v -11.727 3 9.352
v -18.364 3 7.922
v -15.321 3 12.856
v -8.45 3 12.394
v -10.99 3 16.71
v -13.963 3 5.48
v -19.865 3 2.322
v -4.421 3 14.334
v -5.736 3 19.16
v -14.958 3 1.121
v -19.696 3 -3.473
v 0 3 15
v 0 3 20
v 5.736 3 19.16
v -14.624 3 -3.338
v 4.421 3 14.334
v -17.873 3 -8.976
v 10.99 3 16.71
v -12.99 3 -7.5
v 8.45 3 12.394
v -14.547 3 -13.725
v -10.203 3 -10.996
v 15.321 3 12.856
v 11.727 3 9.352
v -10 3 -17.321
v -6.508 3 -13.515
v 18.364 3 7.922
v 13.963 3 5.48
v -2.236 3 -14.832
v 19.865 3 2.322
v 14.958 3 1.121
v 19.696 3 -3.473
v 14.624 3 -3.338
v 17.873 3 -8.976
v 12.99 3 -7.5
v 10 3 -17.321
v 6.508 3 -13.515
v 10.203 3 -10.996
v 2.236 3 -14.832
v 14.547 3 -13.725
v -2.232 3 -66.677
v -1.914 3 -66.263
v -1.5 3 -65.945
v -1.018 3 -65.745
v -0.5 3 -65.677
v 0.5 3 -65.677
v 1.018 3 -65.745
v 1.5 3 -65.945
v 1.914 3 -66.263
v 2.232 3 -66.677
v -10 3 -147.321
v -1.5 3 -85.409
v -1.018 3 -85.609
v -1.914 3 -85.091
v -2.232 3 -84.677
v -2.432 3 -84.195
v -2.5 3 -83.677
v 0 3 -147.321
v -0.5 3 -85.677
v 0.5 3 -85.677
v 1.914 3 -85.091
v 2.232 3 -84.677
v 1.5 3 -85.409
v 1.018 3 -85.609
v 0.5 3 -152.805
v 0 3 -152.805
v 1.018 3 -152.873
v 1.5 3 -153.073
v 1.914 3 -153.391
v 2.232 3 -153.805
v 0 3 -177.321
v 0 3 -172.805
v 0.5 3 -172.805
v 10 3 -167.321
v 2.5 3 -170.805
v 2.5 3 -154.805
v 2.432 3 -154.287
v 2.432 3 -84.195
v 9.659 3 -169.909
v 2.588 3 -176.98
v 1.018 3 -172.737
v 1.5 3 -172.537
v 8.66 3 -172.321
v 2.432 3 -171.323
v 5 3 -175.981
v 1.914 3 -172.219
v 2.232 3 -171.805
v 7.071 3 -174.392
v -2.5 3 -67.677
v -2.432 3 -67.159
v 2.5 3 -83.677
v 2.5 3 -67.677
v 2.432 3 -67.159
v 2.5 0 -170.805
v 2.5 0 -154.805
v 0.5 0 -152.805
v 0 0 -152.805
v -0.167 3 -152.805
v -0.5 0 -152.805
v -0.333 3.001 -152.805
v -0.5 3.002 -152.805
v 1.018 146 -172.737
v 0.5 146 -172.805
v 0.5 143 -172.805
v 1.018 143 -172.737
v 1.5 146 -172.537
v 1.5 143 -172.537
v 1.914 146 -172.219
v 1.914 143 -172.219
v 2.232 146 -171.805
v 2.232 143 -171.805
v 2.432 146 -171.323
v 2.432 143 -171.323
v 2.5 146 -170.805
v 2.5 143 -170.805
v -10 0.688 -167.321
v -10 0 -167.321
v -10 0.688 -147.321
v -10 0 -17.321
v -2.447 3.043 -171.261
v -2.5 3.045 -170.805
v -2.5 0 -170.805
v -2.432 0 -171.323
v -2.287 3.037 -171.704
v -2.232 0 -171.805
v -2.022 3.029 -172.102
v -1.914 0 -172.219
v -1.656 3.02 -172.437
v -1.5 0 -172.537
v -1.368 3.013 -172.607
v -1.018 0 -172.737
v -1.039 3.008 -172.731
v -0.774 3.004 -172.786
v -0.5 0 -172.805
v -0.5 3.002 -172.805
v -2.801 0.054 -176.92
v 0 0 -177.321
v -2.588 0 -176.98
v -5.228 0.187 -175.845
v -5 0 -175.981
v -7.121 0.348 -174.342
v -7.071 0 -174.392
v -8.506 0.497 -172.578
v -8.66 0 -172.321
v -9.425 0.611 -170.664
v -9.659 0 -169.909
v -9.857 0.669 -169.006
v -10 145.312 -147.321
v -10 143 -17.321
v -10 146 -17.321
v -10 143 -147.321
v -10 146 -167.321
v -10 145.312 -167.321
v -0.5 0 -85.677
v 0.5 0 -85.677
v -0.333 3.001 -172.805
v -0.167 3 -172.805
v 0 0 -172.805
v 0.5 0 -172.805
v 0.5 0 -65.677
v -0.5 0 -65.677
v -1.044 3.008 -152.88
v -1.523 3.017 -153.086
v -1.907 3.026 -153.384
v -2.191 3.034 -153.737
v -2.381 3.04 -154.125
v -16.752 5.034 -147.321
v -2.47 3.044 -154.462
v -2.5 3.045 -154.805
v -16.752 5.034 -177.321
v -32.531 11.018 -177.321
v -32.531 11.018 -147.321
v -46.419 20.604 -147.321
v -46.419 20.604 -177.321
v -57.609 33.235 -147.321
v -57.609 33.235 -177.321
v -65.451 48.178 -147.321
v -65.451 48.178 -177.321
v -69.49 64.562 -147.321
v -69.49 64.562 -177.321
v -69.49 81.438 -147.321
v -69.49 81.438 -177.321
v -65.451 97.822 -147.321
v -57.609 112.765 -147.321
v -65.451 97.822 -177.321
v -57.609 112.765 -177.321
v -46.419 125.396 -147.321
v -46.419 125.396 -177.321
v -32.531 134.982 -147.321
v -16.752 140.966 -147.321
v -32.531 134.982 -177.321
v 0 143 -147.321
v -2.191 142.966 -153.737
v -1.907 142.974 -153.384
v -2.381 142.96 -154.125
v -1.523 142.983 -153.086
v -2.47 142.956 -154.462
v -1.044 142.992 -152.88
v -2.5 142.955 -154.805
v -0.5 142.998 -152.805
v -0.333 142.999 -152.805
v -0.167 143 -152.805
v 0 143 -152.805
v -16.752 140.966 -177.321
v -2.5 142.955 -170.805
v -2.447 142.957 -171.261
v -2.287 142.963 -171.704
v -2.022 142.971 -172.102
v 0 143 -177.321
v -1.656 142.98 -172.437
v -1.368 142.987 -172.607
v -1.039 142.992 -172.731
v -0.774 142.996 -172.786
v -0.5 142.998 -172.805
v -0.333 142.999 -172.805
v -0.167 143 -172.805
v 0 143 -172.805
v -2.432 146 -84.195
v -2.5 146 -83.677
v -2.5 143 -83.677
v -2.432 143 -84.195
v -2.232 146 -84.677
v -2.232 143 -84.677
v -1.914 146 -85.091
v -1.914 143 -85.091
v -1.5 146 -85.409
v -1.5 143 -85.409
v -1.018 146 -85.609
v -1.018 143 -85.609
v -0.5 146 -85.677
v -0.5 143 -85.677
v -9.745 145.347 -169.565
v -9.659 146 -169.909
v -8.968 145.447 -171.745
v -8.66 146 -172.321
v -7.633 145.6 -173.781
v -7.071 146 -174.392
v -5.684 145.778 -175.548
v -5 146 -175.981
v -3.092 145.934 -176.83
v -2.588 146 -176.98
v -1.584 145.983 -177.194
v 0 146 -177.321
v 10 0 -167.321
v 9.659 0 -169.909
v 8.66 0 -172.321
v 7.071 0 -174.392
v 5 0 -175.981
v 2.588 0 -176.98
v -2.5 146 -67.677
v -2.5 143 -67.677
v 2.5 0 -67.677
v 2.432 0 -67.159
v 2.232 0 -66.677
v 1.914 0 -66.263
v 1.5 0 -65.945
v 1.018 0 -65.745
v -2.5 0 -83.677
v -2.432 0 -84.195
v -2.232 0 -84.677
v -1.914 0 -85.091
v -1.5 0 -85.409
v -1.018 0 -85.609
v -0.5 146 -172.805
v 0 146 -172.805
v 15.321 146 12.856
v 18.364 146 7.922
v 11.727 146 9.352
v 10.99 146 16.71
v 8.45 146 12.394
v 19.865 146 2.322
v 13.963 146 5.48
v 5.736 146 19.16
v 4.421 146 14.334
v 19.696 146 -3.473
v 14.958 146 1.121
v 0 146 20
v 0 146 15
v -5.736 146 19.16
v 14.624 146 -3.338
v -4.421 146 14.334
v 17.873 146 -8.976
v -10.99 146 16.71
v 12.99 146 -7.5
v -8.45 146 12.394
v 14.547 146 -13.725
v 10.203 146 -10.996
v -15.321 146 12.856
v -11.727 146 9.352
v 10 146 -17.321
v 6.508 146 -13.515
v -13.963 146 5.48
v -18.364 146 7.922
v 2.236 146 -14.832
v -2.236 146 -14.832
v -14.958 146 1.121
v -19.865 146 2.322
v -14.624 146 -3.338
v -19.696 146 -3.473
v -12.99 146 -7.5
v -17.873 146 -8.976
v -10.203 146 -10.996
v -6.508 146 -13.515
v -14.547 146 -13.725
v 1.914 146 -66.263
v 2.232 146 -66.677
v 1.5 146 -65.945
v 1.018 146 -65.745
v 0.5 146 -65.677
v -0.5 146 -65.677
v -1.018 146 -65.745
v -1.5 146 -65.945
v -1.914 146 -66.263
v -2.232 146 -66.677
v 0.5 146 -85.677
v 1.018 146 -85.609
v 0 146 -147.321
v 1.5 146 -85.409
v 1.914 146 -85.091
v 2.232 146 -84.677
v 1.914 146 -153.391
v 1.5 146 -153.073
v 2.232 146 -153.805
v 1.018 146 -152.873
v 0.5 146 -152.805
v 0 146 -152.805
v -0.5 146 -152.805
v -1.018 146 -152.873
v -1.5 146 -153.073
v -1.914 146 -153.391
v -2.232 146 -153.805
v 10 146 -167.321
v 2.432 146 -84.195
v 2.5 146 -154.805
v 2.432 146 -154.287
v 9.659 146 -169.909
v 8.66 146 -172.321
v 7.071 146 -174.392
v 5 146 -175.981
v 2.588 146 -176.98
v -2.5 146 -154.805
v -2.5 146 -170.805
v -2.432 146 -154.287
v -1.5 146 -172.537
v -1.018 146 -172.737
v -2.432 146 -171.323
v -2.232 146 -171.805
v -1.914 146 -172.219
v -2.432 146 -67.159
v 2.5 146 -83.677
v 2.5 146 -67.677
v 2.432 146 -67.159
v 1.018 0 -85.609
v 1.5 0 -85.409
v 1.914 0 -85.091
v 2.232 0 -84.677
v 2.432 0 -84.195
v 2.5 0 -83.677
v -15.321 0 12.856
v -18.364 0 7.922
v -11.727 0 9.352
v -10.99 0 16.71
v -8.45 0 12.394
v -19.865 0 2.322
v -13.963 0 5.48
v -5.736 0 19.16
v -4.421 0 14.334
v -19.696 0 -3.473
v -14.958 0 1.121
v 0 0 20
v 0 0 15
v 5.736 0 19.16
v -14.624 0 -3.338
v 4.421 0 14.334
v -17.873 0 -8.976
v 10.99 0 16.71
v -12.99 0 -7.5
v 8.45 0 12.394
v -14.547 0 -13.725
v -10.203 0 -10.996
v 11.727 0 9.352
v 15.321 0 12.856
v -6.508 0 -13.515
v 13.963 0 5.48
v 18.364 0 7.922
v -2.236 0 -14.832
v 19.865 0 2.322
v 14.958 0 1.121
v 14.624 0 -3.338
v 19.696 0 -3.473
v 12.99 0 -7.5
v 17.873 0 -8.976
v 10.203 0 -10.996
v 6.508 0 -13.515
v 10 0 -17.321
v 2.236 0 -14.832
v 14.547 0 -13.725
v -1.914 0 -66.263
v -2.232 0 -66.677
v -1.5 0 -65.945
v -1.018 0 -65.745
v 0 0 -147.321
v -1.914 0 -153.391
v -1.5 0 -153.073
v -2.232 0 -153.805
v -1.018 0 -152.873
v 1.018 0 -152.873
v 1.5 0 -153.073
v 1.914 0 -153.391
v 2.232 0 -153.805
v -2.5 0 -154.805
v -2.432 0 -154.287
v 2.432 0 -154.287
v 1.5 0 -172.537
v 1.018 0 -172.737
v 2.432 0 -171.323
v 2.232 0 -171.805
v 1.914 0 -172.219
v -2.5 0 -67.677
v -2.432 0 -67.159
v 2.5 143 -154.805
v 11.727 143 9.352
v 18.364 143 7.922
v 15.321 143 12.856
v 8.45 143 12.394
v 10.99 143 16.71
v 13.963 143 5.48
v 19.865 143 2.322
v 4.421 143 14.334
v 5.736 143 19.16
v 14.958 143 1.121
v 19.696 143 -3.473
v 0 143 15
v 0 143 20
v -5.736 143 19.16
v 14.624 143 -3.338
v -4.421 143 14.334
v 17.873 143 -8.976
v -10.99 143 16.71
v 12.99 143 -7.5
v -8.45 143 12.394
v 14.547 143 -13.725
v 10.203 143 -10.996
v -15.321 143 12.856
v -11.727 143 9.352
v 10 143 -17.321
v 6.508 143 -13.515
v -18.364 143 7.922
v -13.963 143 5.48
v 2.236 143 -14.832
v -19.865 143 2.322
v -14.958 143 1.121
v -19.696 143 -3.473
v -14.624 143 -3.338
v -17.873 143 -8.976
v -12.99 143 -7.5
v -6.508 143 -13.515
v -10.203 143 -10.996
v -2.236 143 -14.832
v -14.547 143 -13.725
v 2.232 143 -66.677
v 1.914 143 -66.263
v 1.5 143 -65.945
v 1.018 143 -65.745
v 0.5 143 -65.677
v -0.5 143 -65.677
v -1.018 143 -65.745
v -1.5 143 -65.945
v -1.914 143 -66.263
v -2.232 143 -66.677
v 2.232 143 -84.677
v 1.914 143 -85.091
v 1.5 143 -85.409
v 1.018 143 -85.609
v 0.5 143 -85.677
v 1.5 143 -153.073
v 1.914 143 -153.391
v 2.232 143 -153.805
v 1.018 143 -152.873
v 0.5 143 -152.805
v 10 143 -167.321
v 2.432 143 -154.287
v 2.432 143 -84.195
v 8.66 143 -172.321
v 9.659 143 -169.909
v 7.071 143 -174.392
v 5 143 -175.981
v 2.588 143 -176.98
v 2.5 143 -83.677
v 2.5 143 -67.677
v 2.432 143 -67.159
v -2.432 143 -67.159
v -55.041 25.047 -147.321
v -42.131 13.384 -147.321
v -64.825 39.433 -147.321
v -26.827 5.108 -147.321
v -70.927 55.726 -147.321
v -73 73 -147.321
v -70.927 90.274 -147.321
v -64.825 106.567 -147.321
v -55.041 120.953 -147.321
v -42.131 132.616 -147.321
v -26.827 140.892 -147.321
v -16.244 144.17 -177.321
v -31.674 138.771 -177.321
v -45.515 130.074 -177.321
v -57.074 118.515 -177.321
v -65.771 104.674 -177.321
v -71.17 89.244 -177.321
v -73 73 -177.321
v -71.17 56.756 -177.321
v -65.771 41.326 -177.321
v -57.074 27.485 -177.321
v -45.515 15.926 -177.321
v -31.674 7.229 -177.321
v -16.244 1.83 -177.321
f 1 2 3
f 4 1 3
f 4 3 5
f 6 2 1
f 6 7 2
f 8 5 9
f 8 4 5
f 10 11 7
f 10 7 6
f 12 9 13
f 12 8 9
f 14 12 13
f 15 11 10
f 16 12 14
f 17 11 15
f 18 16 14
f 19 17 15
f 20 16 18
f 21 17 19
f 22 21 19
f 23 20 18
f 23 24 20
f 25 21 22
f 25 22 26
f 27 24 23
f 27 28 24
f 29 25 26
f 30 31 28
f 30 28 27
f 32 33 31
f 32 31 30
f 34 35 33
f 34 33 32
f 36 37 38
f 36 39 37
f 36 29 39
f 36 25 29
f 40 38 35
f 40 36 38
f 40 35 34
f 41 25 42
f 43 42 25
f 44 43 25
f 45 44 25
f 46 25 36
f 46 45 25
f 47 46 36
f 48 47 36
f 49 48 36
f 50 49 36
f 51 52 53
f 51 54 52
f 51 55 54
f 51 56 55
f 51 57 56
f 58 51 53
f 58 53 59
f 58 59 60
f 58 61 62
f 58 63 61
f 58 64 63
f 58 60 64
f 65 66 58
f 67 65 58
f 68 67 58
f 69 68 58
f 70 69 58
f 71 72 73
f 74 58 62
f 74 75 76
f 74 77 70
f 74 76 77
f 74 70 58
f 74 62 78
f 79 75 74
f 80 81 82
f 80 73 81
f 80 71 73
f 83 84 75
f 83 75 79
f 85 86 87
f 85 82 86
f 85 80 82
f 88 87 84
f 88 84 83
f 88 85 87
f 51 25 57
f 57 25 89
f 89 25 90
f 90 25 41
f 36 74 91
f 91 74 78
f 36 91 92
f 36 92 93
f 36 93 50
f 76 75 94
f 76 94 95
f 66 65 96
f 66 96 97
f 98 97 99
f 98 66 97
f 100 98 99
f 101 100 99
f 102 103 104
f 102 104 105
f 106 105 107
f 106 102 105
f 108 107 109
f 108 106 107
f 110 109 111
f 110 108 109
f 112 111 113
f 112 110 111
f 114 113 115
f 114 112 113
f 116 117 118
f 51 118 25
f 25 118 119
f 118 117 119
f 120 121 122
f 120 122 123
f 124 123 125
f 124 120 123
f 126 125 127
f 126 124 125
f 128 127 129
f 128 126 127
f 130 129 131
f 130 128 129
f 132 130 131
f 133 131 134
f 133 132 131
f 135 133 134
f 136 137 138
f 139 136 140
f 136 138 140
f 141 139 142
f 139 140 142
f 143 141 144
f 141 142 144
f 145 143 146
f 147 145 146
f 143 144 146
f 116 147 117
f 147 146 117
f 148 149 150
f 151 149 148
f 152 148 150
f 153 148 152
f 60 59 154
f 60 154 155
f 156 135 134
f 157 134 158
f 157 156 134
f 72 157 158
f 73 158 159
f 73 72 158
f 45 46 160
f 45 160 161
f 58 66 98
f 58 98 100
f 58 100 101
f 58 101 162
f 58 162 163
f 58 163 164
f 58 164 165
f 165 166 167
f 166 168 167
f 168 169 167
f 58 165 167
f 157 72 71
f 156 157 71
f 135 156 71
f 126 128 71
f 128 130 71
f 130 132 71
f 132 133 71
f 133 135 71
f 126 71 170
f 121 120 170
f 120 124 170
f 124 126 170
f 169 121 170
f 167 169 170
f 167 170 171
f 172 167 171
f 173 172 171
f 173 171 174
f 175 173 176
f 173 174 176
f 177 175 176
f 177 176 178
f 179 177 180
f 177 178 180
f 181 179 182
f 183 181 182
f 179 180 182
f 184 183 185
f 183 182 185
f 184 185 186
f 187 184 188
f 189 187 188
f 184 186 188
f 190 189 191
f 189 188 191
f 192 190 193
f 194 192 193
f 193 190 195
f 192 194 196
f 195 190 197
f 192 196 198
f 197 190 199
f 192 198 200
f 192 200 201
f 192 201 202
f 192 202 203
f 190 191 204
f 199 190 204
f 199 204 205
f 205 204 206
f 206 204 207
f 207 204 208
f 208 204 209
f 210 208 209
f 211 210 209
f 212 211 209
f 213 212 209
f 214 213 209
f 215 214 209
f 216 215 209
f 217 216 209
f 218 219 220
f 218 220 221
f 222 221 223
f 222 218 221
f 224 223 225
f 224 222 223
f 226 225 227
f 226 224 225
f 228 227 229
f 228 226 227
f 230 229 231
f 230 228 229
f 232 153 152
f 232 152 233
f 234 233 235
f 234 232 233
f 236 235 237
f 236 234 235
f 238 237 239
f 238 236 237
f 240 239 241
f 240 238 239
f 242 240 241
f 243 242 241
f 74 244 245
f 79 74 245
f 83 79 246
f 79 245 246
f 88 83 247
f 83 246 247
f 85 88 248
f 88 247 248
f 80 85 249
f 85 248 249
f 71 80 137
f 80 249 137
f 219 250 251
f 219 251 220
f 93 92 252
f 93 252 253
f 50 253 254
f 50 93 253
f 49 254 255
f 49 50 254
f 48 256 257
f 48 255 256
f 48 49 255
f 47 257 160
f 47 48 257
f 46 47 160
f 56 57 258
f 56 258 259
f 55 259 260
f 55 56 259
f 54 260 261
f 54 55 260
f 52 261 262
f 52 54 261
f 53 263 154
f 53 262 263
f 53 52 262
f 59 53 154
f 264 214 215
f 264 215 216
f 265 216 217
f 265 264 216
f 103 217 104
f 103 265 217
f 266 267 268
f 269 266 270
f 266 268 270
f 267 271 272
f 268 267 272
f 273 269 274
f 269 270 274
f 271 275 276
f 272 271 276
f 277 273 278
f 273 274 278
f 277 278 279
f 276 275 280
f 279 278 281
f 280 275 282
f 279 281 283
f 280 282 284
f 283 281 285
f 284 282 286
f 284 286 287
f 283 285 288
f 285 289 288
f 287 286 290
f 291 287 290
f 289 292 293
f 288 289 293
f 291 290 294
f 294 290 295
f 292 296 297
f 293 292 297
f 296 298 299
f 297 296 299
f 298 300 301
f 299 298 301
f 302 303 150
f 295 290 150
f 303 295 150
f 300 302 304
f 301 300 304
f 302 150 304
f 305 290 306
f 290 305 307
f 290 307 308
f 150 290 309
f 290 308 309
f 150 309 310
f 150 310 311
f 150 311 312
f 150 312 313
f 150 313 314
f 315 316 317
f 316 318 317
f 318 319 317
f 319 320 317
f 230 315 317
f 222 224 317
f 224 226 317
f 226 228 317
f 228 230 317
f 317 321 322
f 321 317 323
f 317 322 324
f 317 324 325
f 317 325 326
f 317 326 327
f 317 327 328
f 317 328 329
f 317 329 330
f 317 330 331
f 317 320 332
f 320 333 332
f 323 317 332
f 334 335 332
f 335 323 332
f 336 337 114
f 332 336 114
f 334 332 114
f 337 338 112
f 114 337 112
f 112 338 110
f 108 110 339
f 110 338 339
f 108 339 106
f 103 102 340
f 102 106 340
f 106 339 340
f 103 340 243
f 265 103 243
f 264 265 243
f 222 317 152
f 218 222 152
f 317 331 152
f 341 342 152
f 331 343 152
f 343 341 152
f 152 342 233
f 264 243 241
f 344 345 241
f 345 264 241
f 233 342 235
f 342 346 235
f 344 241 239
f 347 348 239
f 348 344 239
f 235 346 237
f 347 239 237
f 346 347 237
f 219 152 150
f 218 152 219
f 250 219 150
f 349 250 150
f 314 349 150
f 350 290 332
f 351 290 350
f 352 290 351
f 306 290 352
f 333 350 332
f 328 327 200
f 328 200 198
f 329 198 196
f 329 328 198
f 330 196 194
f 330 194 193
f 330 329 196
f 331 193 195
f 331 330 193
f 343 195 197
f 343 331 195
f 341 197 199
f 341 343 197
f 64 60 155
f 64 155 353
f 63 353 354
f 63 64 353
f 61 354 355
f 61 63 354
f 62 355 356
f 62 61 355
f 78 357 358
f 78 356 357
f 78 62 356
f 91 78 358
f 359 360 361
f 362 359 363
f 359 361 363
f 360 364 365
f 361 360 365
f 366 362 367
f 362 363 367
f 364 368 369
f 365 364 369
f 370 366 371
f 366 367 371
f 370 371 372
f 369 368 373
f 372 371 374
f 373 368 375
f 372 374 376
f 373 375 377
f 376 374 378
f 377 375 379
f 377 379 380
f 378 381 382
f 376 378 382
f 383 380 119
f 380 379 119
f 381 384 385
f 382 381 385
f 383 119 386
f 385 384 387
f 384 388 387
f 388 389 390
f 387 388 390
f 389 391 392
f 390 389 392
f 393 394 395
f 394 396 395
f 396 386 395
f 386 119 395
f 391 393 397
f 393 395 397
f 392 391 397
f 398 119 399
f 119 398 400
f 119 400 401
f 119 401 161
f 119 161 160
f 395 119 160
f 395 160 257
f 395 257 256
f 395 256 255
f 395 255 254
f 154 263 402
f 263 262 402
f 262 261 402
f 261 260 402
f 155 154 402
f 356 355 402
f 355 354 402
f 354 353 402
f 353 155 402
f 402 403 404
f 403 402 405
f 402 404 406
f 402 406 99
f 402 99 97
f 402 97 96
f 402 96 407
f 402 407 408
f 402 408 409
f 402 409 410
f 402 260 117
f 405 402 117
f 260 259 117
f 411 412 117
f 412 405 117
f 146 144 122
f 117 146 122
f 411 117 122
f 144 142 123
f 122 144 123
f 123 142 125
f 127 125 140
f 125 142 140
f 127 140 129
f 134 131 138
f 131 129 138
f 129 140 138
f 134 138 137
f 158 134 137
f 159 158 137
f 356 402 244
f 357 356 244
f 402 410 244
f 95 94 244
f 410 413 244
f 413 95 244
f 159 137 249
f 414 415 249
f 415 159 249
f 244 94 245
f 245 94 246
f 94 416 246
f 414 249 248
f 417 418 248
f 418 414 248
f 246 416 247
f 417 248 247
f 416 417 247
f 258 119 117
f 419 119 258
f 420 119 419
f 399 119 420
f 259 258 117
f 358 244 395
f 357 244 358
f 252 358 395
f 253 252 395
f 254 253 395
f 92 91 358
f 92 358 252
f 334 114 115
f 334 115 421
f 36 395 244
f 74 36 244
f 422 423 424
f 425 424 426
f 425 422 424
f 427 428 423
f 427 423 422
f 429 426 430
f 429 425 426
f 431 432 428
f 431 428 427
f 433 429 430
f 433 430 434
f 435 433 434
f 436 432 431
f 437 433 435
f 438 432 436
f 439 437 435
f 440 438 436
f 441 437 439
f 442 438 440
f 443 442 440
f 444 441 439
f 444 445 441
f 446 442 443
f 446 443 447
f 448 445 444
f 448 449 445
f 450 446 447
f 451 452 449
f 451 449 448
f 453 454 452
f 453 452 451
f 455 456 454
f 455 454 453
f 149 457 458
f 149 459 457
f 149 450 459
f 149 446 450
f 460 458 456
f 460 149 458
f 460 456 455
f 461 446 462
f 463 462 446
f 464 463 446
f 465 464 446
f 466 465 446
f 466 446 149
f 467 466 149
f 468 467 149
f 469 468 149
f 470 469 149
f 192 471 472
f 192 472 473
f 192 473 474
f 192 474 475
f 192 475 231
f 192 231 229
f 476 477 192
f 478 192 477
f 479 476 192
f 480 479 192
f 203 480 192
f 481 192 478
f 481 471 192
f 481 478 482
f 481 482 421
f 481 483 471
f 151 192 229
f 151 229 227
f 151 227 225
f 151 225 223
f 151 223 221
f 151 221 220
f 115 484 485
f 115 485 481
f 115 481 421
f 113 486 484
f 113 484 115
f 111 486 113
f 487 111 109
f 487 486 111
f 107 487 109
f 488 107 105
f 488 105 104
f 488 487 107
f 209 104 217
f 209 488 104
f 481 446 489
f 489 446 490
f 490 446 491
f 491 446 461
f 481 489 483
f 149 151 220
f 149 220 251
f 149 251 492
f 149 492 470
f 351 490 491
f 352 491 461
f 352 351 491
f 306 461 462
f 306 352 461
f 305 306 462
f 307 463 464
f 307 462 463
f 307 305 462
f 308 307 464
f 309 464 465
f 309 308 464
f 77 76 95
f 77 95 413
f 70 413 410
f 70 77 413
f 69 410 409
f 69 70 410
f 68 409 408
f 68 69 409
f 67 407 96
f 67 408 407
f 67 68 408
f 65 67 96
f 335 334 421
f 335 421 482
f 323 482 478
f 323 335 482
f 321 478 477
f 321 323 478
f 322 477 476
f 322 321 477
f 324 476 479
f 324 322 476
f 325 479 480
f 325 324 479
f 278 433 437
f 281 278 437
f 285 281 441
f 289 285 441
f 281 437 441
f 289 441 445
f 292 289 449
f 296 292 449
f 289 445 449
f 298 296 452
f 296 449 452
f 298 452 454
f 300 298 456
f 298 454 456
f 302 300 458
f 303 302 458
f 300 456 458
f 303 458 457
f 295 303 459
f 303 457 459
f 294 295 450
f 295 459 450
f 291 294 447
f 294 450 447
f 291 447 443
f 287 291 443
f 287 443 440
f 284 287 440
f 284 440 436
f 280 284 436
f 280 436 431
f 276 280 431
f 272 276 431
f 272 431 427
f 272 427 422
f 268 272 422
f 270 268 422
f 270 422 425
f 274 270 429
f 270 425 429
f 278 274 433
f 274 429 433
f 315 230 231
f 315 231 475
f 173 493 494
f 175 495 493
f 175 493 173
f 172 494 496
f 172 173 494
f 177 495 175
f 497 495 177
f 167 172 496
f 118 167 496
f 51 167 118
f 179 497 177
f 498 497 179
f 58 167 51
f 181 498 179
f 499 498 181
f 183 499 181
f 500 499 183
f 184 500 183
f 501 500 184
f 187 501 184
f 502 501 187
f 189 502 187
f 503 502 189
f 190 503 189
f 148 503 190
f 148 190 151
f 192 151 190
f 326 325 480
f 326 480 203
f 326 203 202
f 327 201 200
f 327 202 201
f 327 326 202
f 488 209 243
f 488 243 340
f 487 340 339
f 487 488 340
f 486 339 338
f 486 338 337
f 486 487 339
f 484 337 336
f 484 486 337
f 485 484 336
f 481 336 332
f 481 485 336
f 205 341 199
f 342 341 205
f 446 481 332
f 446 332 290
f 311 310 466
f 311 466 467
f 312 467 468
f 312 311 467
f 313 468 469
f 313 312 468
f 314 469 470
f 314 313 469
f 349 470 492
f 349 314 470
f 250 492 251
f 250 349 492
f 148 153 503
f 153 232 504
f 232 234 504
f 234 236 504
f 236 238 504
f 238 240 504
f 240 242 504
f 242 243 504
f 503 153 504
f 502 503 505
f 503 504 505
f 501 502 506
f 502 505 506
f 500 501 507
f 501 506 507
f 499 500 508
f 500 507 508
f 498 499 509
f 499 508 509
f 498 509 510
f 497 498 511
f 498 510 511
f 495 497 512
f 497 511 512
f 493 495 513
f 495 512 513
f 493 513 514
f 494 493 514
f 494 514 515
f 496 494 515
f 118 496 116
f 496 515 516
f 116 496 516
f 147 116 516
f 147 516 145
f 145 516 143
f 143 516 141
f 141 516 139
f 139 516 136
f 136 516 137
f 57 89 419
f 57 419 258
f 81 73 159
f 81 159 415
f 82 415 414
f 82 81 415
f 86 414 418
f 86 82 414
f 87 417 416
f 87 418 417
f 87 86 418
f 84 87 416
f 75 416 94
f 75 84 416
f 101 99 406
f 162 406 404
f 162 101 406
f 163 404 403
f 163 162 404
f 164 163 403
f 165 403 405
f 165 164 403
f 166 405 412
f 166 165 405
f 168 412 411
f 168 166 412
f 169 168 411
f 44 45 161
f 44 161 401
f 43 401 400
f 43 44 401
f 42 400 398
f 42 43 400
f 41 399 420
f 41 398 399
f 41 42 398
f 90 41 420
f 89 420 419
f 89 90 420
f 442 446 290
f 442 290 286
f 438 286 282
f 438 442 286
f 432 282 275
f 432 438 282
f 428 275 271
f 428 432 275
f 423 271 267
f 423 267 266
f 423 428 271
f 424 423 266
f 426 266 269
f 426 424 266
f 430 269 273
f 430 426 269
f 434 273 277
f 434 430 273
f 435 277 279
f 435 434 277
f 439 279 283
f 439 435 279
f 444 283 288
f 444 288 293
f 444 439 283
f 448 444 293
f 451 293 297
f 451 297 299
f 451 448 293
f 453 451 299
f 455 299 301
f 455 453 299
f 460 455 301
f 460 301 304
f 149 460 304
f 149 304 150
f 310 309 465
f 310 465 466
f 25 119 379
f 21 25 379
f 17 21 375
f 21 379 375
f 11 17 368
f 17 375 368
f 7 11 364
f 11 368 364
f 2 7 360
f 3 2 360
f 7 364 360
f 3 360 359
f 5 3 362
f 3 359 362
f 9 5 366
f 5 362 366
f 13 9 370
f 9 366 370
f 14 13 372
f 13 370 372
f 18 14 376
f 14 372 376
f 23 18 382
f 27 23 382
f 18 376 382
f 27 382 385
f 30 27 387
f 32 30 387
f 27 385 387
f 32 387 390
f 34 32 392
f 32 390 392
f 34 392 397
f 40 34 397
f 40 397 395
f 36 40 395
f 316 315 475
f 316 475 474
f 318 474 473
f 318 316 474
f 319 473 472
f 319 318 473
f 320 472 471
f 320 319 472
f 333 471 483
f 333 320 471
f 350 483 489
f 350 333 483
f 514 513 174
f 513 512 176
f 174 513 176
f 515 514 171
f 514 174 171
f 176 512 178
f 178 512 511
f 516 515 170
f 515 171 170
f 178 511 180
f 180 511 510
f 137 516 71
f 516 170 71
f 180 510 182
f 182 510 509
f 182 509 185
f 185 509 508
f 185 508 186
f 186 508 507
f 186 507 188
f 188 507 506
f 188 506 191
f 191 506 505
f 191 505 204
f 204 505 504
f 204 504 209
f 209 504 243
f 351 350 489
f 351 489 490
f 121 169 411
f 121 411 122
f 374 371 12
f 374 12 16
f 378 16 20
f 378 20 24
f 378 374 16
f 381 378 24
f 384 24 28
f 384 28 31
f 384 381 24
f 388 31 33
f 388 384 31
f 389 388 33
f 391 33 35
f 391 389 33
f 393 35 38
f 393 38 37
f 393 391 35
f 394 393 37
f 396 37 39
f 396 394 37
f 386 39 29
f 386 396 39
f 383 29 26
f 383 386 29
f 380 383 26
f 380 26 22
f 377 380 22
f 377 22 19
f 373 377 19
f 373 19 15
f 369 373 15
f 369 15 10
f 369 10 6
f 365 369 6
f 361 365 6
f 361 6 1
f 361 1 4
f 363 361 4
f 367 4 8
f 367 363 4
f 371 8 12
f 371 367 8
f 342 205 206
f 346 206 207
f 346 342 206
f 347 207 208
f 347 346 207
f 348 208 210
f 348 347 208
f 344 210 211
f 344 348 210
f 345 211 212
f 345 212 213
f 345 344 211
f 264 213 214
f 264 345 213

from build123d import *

# Parameters (mm, degrees)
SKETCH1_R           = 15
BOSS_EXTRUDE1_DEPTH = 3
BOSS_EXTRUDE5_DEPTH = 30
BOSS_EXTRUDE6_START = 3
SKETCH5_R           = 15
BOSS_EXTRUDE6_DEPTH = 3
CUT_EXTRUDE1_DEPTH  = 242.0136151


with BuildPart() as part:
    # Sketch1 → Boss-Extrude1 (new body)
    with BuildSketch(Plane(origin=(0, 0, 0), x_dir=(1, 0, 0), z_dir=(0, 1, 0))):
        with BuildLine():
            Line((-10, 167.320508076), (-10, 17.320508076))
            ThreePointArc((-10, 17.320508076), (0, -20), (10, 17.320508076))
            Line((10, 17.320508076), (10, 167.320508076))
            ThreePointArc((10, 167.320508076), (0, 177.320508076), (-10, 167.320508076))
        make_face()
        with Locations(Location((0, 0, 0), (0, 0, 270))):
            Circle(SKETCH1_R, mode=Mode.SUBTRACT)
    extrude(amount=BOSS_EXTRUDE1_DEPTH)

    # Sketch4 → Boss-Extrude5 (add)
    with BuildSketch(Plane(origin=(0, 0, -177.320508076), x_dir=(-1, 0, 0), z_dir=(0, 0, -1))):
        with BuildLine():
            Line((0, 0), (0, 3))
            ThreePointArc((0, 3), (70, 73), (0, 143))
            Line((0, 143), (0, 146))
            ThreePointArc((0, 146), (73, 73), (0, 0))
        make_face()
    extrude(amount=-BOSS_EXTRUDE5_DEPTH)

    # Sketch5 → Boss-Extrude6 (add)
    with BuildSketch(Plane(origin=(0, 146, 0), x_dir=(-1, 0, 0), z_dir=(0, -1, 0)).offset(BOSS_EXTRUDE6_START)):
        with BuildLine():
            Line((10, 17.320508076), (10, 167.320508076))
            ThreePointArc((10, 167.320508076), (0, 177.320508076), (-10, 167.320508076))
            Line((-10, 167.320508076), (-10, 17.320508076))
            ThreePointArc((-10, 17.320508076), (0, -20), (10, 17.320508076))
        make_face()
        with Locations(Location((0, 0, 0), (0, 0, 270))):
            Circle(SKETCH5_R, mode=Mode.SUBTRACT)
    extrude(amount=-BOSS_EXTRUDE6_DEPTH)

    # Sketch7 → Cut-Extrude1 (cut, through all)
    with BuildSketch(Plane(origin=(0, 146, 0), x_dir=(1, 0, 0), z_dir=(0, 1, 0))):
        with BuildLine():
            Line((0.5, 152.804939292), (-0.5, 152.804939292))
            ThreePointArc((-0.5, 152.804939292), (-1.914213562, 153.39072573), (-2.5, 154.804939292))
            Line((-2.5, 154.804939292), (-2.5, 170.804939292))
            ThreePointArc((-2.5, 170.804939292), (-1.914213562, 172.219152855), (-0.5, 172.804939292))
            Line((-0.5, 172.804939292), (0.5, 172.804939292))
            ThreePointArc((0.5, 172.804939292), (1.914213562, 172.219152855), (2.5, 170.804939292))
            Line((2.5, 170.804939292), (2.5, 154.804939292))
            ThreePointArc((2.5, 154.804939292), (1.914213562, 153.39072573), (0.5, 152.804939292))
        make_face()
        with BuildLine():
            Line((0.5, 65.676892474), (-0.5, 65.676892474))
            ThreePointArc((-0.5, 65.676892474), (-1.914213562, 66.262678911), (-2.5, 67.676892474))
            Line((-2.5, 67.676892474), (-2.5, 83.676892474))
            ThreePointArc((-2.5, 83.676892474), (-1.914213562, 85.091106036), (-0.5, 85.676892474))
            Line((-0.5, 85.676892474), (0.5, 85.676892474))
            ThreePointArc((0.5, 85.676892474), (1.914213562, 85.091106036), (2.5, 83.676892474))
            Line((2.5, 83.676892474), (2.5, 67.676892474))
            ThreePointArc((2.5, 67.676892474), (1.914213562, 66.262678911), (0.5, 65.676892474))
        make_face()
    extrude(amount=-CUT_EXTRUDE1_DEPTH, mode=Mode.SUBTRACT)


solid = part.part
